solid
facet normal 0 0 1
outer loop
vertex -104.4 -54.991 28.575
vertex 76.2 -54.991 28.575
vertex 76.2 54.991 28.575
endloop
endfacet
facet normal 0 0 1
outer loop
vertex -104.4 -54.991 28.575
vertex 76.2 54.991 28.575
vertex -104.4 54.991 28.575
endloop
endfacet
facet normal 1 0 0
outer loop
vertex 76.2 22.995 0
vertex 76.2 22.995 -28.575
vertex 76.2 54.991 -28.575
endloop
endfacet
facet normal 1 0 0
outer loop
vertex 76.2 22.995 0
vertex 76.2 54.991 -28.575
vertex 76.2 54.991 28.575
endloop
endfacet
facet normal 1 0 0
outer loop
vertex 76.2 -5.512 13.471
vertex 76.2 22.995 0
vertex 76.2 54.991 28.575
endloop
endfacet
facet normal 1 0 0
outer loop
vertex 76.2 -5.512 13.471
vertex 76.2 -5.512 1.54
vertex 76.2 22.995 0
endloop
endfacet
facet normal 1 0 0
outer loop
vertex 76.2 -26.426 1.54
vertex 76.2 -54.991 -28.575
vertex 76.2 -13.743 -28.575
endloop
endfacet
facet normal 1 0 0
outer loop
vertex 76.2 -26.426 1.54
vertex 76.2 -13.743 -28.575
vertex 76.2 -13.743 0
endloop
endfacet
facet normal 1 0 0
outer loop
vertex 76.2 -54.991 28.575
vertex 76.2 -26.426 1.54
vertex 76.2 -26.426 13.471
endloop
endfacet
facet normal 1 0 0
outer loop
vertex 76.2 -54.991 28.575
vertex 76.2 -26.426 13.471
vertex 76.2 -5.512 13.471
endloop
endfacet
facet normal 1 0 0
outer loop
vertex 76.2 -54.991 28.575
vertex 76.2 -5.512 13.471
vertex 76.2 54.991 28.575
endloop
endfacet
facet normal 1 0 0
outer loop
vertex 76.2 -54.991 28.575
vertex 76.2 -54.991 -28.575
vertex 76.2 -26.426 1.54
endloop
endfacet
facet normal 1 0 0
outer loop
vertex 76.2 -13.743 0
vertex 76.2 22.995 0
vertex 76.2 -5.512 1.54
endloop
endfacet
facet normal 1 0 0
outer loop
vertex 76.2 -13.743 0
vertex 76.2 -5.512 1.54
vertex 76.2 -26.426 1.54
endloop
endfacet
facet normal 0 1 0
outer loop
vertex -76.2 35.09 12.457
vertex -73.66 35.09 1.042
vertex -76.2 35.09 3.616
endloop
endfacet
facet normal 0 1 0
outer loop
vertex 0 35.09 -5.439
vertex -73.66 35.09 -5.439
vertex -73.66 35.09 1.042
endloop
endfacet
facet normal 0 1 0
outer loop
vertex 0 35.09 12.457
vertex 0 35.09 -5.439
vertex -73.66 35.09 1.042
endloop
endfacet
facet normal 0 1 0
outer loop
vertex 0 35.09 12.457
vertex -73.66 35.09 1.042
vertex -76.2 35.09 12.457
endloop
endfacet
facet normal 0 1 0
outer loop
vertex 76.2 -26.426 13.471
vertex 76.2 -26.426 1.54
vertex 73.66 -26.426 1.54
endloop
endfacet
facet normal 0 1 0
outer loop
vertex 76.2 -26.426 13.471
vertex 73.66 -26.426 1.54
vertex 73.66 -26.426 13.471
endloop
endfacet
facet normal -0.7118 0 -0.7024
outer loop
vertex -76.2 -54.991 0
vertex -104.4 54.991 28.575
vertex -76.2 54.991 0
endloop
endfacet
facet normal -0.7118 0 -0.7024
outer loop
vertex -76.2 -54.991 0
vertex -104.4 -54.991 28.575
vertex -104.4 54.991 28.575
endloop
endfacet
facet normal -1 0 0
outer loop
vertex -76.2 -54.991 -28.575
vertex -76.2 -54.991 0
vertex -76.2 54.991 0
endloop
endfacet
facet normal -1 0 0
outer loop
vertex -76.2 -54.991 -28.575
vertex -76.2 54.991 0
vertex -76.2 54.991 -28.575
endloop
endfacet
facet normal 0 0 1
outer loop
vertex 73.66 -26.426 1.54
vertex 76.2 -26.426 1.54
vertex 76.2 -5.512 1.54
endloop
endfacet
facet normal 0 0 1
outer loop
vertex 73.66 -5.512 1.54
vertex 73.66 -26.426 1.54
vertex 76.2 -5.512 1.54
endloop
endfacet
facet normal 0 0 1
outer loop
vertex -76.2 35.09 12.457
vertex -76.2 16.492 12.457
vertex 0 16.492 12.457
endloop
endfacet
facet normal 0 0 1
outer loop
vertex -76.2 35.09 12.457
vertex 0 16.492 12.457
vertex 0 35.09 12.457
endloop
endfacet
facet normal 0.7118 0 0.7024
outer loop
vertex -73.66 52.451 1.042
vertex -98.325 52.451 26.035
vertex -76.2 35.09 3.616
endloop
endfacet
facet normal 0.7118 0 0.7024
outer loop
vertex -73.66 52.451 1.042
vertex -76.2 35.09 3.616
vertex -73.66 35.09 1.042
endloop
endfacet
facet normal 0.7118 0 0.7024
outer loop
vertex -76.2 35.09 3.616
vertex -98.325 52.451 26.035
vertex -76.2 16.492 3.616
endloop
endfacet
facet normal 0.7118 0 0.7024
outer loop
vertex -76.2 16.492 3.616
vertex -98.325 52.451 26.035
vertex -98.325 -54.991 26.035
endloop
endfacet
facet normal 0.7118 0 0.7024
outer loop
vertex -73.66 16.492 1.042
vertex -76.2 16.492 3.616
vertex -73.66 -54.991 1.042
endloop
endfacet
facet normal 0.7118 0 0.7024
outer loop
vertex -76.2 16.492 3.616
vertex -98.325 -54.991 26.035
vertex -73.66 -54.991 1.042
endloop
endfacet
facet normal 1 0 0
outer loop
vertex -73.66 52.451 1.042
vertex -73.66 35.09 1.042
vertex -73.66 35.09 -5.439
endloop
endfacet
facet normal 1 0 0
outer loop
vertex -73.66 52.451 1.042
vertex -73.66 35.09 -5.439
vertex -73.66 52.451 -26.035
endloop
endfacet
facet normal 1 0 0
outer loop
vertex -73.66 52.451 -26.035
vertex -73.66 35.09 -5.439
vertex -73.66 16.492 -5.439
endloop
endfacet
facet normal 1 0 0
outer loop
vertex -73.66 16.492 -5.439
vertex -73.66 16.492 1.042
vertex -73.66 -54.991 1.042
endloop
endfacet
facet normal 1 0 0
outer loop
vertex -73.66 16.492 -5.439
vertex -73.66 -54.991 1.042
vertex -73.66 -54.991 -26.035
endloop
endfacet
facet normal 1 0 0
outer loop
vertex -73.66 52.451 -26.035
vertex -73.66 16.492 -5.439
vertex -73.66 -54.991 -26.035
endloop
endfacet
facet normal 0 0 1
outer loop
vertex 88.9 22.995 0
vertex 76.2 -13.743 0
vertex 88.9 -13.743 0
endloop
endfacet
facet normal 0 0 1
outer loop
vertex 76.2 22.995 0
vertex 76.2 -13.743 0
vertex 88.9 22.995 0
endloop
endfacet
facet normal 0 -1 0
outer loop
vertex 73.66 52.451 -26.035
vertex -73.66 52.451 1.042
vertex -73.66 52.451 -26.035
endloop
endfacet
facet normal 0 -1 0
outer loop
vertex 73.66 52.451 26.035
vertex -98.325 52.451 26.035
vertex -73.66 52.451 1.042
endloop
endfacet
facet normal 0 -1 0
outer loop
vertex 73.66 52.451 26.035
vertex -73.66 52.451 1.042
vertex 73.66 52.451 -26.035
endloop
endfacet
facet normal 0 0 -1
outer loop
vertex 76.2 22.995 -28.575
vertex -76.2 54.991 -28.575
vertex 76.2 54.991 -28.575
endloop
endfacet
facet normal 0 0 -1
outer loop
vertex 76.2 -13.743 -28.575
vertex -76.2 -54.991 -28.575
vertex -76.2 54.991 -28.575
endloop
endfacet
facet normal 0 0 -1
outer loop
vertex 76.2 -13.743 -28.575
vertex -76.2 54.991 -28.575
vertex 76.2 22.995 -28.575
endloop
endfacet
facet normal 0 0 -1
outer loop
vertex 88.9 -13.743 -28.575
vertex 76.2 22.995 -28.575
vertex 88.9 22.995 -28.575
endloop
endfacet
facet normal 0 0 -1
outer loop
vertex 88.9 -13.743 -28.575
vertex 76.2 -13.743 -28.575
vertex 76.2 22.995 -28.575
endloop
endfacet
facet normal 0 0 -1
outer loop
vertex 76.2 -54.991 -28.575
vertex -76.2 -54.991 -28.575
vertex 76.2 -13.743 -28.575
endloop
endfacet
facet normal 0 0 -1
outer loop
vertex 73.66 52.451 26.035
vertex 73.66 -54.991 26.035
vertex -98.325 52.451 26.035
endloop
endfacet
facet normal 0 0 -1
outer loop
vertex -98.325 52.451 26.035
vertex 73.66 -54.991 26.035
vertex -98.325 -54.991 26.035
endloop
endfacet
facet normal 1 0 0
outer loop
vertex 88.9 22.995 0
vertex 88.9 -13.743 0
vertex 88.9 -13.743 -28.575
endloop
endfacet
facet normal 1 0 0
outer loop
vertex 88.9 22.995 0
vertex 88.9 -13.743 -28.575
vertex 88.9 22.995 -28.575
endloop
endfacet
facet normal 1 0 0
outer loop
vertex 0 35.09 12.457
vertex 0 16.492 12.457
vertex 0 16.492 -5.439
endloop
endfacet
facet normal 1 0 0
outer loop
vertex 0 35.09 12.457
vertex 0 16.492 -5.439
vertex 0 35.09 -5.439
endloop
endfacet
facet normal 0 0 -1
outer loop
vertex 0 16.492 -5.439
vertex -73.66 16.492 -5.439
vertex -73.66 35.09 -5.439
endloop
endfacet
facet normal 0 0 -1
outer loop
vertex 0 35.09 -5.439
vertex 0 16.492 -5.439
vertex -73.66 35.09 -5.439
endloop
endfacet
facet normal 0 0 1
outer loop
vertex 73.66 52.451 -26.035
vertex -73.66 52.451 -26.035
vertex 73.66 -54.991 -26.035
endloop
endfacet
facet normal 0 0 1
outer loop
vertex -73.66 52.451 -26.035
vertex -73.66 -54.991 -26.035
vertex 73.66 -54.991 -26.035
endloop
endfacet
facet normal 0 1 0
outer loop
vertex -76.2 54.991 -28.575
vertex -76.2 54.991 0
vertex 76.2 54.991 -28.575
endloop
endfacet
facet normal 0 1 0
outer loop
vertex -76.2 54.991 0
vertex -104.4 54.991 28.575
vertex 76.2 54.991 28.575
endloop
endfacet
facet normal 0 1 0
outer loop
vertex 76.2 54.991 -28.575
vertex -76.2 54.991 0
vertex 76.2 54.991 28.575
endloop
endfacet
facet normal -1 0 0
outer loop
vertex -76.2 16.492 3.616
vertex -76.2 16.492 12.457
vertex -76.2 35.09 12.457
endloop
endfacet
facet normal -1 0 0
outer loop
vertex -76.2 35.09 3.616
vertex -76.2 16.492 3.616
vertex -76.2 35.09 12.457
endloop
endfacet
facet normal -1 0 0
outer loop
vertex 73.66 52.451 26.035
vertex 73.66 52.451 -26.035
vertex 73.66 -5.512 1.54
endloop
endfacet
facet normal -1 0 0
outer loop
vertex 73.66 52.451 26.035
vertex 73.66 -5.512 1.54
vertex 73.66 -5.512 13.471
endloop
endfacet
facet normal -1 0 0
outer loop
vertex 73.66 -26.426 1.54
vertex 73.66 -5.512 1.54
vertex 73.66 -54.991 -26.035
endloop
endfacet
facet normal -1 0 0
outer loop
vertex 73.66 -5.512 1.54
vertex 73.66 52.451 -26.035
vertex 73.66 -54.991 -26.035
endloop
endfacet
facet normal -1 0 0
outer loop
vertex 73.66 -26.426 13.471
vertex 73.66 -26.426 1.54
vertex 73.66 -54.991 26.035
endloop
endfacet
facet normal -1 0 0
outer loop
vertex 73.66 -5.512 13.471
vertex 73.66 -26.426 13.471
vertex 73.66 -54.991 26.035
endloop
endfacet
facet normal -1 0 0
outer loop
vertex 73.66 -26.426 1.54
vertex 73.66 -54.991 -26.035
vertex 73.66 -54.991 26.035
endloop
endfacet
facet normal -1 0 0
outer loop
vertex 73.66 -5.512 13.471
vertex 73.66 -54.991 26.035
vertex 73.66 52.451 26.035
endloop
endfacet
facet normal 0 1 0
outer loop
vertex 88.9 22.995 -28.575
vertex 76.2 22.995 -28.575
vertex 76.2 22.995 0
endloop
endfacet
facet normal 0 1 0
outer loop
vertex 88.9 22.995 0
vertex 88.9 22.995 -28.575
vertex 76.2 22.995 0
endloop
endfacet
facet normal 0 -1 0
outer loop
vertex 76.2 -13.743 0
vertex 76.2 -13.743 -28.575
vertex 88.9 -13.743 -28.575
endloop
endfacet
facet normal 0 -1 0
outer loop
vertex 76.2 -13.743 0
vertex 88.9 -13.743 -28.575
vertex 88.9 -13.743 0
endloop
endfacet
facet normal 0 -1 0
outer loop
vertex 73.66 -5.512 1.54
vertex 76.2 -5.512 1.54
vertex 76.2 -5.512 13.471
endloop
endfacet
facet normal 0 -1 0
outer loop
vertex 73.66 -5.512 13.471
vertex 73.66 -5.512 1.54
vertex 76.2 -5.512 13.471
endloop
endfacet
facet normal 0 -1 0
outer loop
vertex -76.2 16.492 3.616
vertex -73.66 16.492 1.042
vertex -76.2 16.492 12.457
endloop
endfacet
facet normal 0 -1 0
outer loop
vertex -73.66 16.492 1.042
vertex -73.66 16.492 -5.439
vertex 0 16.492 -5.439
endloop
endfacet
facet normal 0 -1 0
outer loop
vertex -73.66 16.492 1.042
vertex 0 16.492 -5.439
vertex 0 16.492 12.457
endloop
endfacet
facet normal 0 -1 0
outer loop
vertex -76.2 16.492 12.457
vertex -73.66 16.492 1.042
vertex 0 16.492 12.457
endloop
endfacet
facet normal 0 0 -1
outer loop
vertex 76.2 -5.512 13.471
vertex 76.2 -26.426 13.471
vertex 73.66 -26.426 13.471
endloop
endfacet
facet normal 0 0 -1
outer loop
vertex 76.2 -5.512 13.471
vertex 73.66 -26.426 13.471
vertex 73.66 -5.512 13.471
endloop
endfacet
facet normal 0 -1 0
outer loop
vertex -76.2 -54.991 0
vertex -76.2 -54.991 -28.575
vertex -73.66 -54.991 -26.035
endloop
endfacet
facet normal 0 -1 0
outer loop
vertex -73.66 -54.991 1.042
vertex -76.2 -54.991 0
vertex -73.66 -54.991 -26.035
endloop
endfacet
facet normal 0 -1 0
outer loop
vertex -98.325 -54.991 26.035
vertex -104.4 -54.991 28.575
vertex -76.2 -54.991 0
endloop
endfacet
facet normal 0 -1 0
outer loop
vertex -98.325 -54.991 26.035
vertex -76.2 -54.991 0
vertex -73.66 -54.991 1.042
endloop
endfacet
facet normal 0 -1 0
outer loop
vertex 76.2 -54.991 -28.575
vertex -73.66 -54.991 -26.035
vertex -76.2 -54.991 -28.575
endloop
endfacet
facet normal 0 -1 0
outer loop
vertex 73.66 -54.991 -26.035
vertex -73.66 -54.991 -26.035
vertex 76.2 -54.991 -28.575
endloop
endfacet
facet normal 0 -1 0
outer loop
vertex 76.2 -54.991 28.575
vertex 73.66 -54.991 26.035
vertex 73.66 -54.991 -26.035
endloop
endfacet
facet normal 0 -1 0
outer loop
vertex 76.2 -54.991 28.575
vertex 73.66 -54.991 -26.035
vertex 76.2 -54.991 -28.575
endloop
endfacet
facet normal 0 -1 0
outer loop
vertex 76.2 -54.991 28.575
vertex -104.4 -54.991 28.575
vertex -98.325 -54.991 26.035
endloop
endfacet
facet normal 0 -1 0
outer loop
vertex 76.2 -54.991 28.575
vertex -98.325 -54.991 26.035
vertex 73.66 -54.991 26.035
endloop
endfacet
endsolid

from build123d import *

# Parameters (mm, degrees)
F0_W     = 24
F0_H     = 28.575
F1_DEPTH = 54.991
F2_T     = -2.54
F3_W     = 18.5978077352
F3_H     = 17.8960040212
F4_DEPTH = 76.2
F5_W     = 36.7379160598
F5_H     = 28.575
F6_DEPTH = 12.7
F7_W     = 20.9140316583
F7_H     = 11.9311325252
F8_DEPTH = 25.4


# Not quite as in the source:
# - a feature of the source that left no trace in its solid (it failed there, or was rolled back) is left out


with BuildPart() as f1:
    # F0 (on Front) → F1 (new body, symmetric)
    with BuildSketch(Plane.XZ):
        Polygon((-76.2, -28.575), (76.2, -28.575), (76.2, 28.575), (0, 28.575), (28.2, 0), (-52.2, 0), (-76.2, 0), align=None)
        Polygon((-104.4, 28.575), (-76.2, 0), (-76.2, 28.575), align=None)
        with Locations((-64.2, 14.2875)):
            Rectangle(F0_W, F0_H)
        Polygon((28.2, 0), (0, 28.575), (-52.2, 28.575), (-52.2, 0), align=None)
    extrude(amount=F1_DEPTH, both=True)

    # F2
    f2_openings = [f1.faces().sort_by_distance(p)[0] for p in [
        (-3.78476, -54.991, 0.842286),
    ]]
    offset(amount=F2_T, openings=f2_openings, kind=Kind.INTERSECTION)

    # F3 (on Right) → F4 (join, through all)
    with BuildSketch(Plane.YZ):
        with Locations((25.7912892848, 3.5090195015)):
            Rectangle(F3_W, F3_H)
    extrude(amount=-F4_DEPTH)

    # F5 (on face) → F6 (join)
    with BuildSketch(Plane.YZ.offset(76.2)):
        with Locations((4.6260296367, -14.2875)):
            Rectangle(F5_W, F5_H)
    extrude(amount=F6_DEPTH)

    # F7 (on face) → F8 (cut)
    with BuildSketch(Plane.YZ.offset(76.2)):
        with Locations((-15.9690368455, 7.5058937073)):
            Rectangle(F7_W, F7_H)
    extrude(amount=-F8_DEPTH, mode=Mode.SUBTRACT)


solid = f1.part
